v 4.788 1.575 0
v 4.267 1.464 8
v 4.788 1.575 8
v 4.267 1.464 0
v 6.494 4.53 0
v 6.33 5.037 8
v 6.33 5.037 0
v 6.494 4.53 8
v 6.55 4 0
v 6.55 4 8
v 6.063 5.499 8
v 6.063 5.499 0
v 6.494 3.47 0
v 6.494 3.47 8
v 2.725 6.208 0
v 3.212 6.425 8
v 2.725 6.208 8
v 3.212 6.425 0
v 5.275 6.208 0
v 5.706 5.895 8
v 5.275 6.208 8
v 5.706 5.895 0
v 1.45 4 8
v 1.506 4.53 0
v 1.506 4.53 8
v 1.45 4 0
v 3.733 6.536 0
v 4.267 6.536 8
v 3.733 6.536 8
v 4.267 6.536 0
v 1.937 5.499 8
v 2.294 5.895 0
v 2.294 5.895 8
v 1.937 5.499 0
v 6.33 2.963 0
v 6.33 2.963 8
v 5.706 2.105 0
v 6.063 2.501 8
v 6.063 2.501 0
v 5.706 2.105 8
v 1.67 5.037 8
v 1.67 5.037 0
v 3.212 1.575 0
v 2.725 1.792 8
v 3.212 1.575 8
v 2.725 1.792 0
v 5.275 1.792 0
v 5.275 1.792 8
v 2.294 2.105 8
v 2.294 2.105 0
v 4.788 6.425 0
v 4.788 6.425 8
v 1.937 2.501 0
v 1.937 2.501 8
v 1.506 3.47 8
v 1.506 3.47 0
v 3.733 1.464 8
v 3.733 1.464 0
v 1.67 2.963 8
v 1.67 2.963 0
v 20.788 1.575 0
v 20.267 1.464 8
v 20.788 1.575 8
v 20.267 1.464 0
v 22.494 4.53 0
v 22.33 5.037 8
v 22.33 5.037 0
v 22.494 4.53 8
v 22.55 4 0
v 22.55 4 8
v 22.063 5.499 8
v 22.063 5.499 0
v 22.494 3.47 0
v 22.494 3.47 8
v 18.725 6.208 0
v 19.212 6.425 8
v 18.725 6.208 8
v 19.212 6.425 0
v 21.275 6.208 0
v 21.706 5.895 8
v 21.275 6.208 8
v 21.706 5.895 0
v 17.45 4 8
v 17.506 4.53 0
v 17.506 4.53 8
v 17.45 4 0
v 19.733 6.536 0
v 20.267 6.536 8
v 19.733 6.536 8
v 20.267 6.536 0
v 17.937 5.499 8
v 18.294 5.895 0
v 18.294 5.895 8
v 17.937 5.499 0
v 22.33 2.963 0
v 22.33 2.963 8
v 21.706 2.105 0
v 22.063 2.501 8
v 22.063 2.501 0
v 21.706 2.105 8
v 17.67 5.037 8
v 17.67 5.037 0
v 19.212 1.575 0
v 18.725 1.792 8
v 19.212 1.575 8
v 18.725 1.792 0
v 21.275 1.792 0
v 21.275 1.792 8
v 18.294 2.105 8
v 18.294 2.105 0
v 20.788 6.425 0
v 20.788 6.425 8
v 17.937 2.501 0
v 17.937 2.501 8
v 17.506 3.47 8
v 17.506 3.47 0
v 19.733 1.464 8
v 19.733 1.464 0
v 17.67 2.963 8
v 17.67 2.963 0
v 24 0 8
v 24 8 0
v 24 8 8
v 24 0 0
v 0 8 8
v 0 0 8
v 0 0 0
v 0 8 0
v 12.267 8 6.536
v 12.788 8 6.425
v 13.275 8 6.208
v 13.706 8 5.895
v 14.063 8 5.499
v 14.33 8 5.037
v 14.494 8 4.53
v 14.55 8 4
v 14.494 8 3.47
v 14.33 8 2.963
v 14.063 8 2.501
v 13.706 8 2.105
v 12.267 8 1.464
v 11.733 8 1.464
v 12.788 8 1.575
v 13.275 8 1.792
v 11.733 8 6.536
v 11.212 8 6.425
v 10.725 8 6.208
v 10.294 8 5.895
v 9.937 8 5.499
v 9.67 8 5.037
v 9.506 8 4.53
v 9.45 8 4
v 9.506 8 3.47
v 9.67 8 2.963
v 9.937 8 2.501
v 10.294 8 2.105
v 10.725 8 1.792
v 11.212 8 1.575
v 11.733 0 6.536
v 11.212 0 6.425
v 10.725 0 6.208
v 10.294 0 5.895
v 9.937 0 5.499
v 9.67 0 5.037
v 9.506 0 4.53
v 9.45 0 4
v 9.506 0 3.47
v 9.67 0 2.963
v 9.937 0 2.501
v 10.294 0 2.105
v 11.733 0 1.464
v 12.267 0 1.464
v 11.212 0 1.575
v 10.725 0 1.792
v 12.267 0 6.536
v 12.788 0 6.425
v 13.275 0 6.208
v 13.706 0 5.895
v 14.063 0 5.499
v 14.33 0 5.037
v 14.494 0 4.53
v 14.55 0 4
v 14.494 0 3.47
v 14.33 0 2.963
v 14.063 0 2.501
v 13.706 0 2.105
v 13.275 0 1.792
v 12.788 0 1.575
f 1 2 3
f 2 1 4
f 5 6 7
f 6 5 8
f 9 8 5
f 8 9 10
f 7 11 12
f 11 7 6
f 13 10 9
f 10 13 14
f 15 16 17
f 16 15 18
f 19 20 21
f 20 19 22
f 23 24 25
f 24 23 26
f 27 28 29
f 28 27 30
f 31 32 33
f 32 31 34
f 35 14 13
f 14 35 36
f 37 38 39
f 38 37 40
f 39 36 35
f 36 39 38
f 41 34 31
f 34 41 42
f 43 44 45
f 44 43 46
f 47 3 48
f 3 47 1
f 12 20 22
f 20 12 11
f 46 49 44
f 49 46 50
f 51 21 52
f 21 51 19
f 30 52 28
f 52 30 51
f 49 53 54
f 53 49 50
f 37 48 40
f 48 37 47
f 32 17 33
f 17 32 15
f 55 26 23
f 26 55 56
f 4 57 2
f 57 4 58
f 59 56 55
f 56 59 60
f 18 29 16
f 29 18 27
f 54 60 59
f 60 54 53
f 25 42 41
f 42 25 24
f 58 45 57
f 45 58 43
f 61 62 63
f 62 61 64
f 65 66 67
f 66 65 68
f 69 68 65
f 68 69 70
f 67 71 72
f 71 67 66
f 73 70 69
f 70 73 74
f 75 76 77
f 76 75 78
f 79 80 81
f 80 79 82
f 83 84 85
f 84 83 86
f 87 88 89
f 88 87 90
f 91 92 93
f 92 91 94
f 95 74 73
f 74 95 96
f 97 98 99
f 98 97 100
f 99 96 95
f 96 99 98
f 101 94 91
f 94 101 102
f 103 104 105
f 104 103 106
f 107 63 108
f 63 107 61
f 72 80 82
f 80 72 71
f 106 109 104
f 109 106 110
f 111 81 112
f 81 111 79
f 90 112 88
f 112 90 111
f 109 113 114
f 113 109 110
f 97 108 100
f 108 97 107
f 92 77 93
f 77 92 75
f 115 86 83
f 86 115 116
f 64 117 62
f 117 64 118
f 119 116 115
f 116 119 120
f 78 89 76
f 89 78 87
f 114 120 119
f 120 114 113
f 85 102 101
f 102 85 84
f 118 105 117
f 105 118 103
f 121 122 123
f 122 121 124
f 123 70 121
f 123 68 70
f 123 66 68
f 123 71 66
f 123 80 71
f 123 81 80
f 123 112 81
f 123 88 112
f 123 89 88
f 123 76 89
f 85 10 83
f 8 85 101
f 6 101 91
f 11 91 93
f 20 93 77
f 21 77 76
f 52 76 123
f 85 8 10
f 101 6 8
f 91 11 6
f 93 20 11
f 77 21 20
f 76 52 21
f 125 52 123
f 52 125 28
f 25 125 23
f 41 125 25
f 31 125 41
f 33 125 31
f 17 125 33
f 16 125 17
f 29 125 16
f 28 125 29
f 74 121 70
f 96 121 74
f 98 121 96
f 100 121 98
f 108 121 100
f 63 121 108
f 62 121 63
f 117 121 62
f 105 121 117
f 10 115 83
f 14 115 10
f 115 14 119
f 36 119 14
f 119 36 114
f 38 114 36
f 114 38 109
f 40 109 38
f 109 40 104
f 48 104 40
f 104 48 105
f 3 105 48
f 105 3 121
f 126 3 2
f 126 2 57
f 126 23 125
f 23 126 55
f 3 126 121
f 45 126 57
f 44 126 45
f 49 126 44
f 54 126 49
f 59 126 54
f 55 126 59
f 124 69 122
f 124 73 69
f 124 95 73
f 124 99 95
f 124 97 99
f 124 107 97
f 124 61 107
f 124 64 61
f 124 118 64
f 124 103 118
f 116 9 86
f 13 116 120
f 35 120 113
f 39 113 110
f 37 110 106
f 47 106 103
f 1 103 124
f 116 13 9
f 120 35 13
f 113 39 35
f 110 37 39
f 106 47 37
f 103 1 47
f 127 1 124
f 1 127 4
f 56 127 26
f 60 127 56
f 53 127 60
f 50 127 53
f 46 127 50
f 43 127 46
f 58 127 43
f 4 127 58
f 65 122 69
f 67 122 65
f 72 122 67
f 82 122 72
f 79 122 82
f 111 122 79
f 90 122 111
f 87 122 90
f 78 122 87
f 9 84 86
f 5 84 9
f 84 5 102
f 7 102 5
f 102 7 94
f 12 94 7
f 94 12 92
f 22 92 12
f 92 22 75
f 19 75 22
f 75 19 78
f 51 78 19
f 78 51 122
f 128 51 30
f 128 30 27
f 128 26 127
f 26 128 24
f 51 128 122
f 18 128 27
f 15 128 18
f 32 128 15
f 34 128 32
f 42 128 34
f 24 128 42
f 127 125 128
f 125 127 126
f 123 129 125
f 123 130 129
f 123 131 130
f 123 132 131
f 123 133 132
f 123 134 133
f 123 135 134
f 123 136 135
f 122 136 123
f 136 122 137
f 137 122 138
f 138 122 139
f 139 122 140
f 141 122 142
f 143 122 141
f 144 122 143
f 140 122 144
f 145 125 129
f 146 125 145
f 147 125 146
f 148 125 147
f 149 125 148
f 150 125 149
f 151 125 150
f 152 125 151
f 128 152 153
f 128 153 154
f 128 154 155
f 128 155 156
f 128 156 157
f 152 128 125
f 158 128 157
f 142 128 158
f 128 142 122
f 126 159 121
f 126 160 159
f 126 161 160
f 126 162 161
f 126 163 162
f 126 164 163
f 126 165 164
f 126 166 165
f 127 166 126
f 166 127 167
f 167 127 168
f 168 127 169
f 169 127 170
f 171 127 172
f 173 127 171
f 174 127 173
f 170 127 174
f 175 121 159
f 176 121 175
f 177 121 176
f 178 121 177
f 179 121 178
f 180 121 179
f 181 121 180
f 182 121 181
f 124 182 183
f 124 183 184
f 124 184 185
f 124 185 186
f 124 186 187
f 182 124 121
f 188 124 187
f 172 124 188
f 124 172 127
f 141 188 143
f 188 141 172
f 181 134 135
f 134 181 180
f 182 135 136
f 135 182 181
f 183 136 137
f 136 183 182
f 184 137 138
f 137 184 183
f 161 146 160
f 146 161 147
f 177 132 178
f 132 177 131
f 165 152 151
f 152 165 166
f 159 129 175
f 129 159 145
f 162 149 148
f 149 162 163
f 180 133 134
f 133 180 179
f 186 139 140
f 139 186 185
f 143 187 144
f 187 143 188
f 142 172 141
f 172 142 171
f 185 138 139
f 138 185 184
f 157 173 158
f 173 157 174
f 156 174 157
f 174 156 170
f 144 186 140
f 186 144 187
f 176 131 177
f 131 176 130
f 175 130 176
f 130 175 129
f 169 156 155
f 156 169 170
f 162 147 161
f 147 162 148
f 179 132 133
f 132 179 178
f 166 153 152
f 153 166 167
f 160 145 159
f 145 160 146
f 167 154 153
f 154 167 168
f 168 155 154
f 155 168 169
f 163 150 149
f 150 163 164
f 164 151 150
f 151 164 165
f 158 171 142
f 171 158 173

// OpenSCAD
// Description: "Bitbeam construction toy"
// Project home: http://bitbeam.org

// Each bitbeam is 8mm inches wide. 
// Center of each hole is 8mm apart from each other
// Holes are 5.1 mm in diameter.

// Mini
//beam_width     = 4;
//hole_diameter  = 2.2;

// Standard
beam_width     = 8;
hole_diameter  = 5.1;

hole_radius    = hole_diameter / 2;

module beam(number_of_holes) {
    beam_length = number_of_holes * beam_width;
    difference() {
        // Draw the beam...
        cube([beam_length,beam_width,beam_width]);
    
        // Cut the holes...
        for (x=[beam_width/2 : beam_width*2 : beam_length]) {
            translate([x,beam_width/2,-2])
            cylinder(r=hole_radius, h=beam_width*1.5, $fn=30);
        }
        for (x=[beam_width/2 + beam_width : beam_width*2 : beam_length]) {
            rotate([90,0,0])
            translate([x,beam_width/2,-beam_width*1.5])
            cylinder(r=hole_radius, h=beam_width*2, $fn=30);
        }

        // Optional through-hole
        //rotate([0,90,0])
        //translate([-beam_width/2,beam_width/2,-2])
        //cylinder(r=hole_radius, h=number_of_holes*beam_width+4, $fn=30);
    }
}

beam(3);
